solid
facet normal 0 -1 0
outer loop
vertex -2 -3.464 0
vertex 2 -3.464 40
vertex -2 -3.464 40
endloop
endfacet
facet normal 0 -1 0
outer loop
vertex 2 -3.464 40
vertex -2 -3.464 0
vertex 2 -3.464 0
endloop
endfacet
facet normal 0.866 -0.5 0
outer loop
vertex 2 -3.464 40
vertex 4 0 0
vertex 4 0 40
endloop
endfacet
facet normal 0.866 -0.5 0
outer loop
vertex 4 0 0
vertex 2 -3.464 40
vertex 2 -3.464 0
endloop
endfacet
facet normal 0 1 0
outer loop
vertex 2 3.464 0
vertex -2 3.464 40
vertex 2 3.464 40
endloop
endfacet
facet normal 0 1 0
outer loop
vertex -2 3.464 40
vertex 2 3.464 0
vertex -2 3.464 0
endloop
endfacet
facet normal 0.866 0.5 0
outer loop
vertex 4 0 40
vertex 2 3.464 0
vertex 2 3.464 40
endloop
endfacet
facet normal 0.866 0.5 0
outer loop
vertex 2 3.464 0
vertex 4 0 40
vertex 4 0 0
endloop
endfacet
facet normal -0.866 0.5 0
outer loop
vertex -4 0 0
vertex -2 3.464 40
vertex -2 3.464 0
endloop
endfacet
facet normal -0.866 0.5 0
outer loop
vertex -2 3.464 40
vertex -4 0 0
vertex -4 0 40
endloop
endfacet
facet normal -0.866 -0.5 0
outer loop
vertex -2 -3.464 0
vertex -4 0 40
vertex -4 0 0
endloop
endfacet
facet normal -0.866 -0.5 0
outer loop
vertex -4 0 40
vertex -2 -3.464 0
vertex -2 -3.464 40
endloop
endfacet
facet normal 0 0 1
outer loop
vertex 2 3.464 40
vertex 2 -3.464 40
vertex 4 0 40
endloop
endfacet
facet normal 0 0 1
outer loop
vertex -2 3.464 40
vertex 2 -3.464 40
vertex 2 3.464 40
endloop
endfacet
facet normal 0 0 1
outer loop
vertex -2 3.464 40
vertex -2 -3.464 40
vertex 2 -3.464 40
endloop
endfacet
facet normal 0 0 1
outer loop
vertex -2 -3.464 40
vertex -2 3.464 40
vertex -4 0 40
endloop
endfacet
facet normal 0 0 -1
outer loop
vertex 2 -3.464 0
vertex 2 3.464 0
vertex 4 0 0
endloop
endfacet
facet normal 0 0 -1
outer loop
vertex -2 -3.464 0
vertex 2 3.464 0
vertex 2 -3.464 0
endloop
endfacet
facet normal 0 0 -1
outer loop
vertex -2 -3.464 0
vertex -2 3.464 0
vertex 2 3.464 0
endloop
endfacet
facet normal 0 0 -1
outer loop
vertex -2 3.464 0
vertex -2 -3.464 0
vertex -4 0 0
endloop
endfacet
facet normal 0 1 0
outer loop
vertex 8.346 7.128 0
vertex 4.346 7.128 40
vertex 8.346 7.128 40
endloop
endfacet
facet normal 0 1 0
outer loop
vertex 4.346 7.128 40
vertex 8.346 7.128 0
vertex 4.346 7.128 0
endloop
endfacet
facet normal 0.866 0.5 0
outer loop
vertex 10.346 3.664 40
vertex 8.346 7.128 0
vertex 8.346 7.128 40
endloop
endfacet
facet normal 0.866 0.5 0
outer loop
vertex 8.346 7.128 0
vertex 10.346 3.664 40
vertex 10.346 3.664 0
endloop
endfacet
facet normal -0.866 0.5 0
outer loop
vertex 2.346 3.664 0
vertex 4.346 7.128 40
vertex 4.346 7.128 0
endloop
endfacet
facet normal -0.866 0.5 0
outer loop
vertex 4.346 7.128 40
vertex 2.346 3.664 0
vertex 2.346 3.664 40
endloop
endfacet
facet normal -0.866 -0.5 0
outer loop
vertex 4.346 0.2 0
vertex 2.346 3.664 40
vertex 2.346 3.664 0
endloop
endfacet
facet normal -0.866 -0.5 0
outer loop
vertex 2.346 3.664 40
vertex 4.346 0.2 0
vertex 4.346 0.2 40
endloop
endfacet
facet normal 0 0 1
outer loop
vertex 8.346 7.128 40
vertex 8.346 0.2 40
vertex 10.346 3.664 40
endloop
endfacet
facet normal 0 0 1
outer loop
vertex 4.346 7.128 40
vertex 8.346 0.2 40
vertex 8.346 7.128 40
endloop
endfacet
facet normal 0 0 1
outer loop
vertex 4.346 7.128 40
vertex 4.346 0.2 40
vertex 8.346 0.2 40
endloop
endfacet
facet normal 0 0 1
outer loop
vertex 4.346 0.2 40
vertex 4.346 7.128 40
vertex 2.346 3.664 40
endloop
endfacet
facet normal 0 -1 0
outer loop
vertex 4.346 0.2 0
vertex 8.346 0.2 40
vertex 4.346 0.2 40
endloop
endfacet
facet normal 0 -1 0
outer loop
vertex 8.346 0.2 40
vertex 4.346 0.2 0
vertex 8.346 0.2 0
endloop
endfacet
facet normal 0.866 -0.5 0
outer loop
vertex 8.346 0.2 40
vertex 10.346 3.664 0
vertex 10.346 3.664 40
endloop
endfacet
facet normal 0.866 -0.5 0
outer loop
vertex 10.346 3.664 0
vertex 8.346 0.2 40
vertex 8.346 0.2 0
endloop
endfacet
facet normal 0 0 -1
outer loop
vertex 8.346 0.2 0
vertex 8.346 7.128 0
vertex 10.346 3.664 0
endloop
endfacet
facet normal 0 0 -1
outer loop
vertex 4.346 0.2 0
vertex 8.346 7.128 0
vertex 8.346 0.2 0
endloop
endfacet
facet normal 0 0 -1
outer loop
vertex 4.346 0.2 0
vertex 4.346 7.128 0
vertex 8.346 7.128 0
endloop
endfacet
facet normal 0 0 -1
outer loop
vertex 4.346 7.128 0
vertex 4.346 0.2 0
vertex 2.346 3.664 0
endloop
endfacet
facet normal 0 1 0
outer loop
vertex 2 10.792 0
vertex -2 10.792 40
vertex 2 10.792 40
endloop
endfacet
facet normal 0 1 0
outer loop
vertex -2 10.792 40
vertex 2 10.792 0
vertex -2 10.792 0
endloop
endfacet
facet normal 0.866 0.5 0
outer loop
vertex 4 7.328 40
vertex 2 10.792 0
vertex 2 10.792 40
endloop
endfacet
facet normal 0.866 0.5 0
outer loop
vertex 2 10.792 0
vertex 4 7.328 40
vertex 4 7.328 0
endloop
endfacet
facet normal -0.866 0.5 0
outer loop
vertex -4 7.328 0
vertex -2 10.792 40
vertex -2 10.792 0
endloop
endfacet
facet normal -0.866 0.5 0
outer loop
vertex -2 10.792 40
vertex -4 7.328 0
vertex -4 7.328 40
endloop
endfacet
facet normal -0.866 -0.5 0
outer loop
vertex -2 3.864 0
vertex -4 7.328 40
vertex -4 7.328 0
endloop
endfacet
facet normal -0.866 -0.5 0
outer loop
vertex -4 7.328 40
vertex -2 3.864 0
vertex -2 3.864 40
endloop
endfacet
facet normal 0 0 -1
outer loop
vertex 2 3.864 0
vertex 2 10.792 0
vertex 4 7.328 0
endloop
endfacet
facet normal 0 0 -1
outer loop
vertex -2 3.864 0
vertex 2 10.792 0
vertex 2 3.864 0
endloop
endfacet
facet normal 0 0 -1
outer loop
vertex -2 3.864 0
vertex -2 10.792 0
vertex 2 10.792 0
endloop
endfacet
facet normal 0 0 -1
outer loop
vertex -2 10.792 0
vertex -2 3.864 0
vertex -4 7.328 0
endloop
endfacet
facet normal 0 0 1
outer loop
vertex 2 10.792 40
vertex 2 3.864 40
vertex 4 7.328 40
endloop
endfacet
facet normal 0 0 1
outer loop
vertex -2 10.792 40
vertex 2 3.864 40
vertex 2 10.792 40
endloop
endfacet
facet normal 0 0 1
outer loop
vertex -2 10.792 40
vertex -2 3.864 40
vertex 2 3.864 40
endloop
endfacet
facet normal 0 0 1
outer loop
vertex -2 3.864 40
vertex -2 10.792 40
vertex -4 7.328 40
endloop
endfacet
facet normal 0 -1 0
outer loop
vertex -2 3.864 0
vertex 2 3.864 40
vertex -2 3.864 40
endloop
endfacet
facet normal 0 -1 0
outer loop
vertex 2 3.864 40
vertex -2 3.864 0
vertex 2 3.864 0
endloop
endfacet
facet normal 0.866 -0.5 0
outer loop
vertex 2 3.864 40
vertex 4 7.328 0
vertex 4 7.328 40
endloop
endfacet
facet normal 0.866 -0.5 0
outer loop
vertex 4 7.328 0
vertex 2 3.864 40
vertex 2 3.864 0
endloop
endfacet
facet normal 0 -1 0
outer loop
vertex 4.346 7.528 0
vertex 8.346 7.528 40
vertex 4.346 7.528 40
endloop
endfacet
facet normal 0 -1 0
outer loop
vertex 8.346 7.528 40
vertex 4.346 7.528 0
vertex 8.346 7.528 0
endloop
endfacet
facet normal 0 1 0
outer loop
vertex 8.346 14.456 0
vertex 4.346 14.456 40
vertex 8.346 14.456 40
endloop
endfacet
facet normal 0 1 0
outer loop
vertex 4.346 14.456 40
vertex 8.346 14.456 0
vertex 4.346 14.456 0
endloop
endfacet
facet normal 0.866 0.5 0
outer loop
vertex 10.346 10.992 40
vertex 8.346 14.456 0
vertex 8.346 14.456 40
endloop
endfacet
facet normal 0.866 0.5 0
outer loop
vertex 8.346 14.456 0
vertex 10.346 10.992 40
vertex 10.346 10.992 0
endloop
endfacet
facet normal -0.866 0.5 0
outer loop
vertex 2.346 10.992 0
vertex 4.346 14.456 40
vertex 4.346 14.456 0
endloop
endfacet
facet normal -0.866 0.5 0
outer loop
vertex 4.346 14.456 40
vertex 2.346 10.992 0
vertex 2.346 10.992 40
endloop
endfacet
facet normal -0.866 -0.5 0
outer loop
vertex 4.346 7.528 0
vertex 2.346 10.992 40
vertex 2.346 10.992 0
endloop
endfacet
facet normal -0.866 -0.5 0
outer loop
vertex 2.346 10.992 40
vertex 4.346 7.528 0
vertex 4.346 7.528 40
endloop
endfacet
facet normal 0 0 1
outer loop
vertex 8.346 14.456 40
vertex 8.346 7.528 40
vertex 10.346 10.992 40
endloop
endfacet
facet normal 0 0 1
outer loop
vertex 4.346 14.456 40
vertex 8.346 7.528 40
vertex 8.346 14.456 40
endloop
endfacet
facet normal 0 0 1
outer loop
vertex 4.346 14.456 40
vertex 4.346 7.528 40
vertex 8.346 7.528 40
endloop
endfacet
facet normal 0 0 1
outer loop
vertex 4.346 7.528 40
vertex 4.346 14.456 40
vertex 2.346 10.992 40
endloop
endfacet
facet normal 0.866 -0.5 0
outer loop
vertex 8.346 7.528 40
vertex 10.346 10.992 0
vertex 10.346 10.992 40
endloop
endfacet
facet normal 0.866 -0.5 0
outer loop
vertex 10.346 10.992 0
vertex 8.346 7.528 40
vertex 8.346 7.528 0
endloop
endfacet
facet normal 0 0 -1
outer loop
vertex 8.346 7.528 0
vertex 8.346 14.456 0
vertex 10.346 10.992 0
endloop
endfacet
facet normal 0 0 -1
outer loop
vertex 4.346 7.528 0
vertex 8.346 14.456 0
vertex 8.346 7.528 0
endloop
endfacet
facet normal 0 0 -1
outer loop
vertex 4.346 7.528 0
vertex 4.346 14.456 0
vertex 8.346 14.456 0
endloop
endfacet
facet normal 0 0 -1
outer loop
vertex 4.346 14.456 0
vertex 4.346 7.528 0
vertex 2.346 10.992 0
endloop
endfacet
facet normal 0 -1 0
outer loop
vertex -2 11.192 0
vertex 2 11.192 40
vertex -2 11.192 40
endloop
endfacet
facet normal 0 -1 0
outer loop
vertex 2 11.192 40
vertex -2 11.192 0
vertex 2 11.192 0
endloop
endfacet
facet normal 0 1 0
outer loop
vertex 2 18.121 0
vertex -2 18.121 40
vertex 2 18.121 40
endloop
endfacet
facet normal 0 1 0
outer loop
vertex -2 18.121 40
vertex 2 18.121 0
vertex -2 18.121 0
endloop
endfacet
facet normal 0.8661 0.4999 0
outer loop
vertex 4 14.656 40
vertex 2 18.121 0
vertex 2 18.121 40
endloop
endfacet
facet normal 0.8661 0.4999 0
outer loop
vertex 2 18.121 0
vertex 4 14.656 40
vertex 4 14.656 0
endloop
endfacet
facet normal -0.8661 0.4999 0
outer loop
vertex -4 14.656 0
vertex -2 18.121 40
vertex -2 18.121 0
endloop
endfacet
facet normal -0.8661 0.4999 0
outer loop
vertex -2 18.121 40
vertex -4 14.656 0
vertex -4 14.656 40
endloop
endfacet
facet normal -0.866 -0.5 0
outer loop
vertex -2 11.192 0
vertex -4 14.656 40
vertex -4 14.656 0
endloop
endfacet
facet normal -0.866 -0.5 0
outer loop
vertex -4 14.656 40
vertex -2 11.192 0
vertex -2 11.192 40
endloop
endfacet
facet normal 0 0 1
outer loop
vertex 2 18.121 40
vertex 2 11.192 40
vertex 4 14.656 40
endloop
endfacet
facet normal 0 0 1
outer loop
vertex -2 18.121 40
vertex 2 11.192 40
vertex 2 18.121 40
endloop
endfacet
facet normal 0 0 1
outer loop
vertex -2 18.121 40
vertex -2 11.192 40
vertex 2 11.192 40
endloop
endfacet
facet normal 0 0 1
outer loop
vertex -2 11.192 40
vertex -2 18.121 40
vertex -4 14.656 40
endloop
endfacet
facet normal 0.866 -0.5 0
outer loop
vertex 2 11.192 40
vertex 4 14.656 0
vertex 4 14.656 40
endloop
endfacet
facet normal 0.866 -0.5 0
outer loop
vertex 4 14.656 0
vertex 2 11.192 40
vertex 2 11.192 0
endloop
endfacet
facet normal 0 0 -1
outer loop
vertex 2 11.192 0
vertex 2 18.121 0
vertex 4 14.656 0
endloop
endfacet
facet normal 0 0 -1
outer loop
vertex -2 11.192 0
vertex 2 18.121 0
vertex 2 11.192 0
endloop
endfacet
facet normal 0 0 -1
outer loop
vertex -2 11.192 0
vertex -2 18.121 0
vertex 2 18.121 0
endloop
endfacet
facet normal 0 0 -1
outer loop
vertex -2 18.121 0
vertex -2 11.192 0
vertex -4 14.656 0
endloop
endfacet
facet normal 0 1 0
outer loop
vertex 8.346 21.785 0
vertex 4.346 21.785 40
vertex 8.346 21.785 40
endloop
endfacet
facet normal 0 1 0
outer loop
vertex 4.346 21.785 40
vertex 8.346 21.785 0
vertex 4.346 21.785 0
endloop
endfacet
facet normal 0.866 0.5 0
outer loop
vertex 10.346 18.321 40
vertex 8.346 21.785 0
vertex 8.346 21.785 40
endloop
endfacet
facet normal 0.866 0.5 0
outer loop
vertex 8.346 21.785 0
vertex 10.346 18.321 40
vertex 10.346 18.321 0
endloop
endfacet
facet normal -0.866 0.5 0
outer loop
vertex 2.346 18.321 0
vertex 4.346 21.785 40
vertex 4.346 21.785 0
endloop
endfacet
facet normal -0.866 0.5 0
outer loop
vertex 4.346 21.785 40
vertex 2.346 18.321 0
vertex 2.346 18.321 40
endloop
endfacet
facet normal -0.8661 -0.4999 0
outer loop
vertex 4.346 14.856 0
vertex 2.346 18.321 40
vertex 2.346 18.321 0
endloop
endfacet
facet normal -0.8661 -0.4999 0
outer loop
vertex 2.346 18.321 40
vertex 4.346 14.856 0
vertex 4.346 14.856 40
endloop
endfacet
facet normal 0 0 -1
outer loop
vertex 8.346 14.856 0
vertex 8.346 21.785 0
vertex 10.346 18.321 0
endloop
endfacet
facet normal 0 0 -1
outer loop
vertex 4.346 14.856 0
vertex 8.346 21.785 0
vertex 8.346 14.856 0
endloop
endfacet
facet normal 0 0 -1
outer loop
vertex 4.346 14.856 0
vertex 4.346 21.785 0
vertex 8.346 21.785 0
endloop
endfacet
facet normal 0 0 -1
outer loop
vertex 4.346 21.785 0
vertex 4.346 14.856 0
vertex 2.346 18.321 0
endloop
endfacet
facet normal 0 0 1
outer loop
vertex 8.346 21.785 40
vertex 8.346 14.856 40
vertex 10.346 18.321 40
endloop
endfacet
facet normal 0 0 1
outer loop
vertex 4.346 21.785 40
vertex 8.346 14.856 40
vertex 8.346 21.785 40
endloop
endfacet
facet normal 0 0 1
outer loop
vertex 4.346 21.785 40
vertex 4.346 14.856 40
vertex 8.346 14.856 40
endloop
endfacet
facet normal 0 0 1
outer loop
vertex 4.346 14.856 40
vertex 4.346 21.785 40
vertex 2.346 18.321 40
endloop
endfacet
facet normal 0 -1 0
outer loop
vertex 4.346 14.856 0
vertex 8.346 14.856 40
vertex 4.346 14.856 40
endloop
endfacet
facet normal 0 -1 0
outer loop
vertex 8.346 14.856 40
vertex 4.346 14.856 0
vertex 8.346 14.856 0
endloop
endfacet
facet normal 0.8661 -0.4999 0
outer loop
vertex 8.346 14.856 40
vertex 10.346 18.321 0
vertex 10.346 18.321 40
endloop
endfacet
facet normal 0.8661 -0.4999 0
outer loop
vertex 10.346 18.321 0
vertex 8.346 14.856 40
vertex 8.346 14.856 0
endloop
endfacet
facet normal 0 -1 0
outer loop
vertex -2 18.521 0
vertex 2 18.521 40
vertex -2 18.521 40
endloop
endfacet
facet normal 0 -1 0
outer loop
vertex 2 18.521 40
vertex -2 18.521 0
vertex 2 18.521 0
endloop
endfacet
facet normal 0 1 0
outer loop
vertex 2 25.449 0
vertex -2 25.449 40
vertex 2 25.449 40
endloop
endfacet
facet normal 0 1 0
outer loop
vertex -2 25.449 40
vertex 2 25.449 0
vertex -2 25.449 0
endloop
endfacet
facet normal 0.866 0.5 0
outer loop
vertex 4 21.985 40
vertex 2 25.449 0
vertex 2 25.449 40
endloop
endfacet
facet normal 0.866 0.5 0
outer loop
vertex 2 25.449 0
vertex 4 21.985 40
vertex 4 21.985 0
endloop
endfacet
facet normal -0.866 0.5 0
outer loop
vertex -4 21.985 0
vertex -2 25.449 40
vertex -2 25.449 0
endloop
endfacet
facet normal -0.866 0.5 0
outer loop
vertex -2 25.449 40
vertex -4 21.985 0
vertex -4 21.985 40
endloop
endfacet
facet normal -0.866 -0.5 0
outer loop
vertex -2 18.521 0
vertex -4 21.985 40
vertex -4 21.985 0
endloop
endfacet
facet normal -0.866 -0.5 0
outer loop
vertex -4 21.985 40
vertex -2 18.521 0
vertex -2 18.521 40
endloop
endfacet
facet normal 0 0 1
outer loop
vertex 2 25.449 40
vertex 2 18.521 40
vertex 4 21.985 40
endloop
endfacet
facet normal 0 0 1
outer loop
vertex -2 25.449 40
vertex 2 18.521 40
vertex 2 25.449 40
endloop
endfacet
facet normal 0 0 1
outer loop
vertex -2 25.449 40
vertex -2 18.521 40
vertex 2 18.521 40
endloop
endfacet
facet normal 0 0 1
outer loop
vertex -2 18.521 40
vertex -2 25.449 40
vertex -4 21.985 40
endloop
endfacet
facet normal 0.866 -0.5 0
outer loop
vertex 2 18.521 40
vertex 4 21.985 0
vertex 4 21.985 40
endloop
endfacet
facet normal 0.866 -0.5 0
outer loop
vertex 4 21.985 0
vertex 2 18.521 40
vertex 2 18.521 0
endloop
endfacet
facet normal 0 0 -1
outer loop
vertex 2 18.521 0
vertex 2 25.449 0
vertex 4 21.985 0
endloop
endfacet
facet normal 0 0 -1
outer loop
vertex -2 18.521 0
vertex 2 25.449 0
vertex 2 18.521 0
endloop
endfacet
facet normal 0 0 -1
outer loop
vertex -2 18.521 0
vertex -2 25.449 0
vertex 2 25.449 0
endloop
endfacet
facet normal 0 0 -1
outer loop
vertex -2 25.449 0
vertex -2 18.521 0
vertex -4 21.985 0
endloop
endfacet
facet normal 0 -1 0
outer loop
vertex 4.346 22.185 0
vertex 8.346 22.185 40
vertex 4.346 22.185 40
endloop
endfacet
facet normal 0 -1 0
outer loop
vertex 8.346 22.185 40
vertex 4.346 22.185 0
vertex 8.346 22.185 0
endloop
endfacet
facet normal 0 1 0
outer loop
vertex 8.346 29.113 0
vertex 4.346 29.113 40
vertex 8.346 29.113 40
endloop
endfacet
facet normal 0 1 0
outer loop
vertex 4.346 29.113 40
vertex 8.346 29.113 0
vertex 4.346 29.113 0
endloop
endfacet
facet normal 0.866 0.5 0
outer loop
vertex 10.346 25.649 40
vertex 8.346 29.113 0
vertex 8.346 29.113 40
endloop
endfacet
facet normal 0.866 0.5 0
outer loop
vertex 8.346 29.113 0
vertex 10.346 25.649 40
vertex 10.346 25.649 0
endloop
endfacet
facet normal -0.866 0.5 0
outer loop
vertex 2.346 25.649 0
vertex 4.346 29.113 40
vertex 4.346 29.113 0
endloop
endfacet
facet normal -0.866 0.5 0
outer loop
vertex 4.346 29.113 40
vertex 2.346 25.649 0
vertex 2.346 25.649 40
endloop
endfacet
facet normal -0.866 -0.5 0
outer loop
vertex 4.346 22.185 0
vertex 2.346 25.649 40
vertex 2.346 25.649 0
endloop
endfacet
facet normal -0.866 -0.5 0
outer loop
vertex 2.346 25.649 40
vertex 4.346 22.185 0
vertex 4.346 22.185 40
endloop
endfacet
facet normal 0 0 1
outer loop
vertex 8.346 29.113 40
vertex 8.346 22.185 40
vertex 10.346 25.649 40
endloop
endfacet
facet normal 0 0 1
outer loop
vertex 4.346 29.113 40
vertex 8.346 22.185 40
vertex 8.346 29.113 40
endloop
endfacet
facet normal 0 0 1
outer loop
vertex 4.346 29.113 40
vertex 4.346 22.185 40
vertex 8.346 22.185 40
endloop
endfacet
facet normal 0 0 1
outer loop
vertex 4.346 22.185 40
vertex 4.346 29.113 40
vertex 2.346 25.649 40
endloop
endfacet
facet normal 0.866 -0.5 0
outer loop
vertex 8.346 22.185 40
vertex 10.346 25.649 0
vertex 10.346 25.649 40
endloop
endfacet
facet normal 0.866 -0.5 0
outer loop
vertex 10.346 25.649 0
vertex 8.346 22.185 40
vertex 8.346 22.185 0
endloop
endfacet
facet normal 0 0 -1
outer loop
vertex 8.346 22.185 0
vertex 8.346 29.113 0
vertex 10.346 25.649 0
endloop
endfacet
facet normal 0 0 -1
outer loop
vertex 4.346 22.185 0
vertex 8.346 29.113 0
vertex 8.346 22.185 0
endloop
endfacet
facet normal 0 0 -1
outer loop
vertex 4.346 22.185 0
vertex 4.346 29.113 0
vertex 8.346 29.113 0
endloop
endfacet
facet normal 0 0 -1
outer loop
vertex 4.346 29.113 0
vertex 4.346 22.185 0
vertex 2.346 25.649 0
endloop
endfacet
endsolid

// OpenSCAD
x1=67.8;
x2=65.5;
//y=46.2;
y=47.0;
edge=2.5;
w=0.4;
hexw=8;
hexh=40;
hexshiftx = hexh+w;
hexshifty = hexh+w;
hexoffx   = hexw+w;
hexoffy   = (hexw+w)/2;

for (iy=[0:3]) {
    translate([0,(w+sqrt(3)/2*hexw)*iy,0]) cylinder(r=hexw/2, h=hexh, $fn=6);
    translate([3/4*(hexw)+w*sqrt(3)/2,(w+sqrt(3)/2*hexw)/2+iy*(w+sqrt(3)/2*hexw),0]) cylinder(r=hexw/2, h=hexh, $fn=6);
}
//for (iy=[0:1]) {
//    translate([0,(hexw+w)*iy,0]) cylinder(r=hexw/2, h=hexh, $fn=6);
//    %translate([hexw+(1+sin(60))*w-sin(30)*hexw/2,(hexw+w)/2+(hexw+w)*iy,0]) cylinder(r=hexw/2, h=hexh, $fn=6);
//}

module aufsatz() {
linear_extrude(height = 20)
    polygon(points = [
        //outer space
        [-x1/2+edge-w,-y/2-w],
        [x1/2-edge+w,-y/2-w],
        [x1/2+w,-y/2+edge-w],
        [x2/2+w,y/2-edge+w],
        [x2/2-edge+w,y/2+w],
        [-x2/2+edge-w,y/2+w],
        [-x2/2-w,y/2-edge+w],
        [-x1/2-w,-y/2+edge-w],
        // inner space
        [-x1/2+edge,-y/2],
        [x1/2-edge,-y/2],
        [x1/2,-y/2+edge],
        [x2/2,y/2-edge],
        [x2/2-edge,y/2],
        [-x2/2+edge,y/2],
        [-x2/2,y/2-edge],
        [-x1/2,-y/2+edge]
        ], paths = [
        [0,1,2,3,4,5,6,7],
        [8,9,10,11,12,13,14,15]
        ]
    );
}
